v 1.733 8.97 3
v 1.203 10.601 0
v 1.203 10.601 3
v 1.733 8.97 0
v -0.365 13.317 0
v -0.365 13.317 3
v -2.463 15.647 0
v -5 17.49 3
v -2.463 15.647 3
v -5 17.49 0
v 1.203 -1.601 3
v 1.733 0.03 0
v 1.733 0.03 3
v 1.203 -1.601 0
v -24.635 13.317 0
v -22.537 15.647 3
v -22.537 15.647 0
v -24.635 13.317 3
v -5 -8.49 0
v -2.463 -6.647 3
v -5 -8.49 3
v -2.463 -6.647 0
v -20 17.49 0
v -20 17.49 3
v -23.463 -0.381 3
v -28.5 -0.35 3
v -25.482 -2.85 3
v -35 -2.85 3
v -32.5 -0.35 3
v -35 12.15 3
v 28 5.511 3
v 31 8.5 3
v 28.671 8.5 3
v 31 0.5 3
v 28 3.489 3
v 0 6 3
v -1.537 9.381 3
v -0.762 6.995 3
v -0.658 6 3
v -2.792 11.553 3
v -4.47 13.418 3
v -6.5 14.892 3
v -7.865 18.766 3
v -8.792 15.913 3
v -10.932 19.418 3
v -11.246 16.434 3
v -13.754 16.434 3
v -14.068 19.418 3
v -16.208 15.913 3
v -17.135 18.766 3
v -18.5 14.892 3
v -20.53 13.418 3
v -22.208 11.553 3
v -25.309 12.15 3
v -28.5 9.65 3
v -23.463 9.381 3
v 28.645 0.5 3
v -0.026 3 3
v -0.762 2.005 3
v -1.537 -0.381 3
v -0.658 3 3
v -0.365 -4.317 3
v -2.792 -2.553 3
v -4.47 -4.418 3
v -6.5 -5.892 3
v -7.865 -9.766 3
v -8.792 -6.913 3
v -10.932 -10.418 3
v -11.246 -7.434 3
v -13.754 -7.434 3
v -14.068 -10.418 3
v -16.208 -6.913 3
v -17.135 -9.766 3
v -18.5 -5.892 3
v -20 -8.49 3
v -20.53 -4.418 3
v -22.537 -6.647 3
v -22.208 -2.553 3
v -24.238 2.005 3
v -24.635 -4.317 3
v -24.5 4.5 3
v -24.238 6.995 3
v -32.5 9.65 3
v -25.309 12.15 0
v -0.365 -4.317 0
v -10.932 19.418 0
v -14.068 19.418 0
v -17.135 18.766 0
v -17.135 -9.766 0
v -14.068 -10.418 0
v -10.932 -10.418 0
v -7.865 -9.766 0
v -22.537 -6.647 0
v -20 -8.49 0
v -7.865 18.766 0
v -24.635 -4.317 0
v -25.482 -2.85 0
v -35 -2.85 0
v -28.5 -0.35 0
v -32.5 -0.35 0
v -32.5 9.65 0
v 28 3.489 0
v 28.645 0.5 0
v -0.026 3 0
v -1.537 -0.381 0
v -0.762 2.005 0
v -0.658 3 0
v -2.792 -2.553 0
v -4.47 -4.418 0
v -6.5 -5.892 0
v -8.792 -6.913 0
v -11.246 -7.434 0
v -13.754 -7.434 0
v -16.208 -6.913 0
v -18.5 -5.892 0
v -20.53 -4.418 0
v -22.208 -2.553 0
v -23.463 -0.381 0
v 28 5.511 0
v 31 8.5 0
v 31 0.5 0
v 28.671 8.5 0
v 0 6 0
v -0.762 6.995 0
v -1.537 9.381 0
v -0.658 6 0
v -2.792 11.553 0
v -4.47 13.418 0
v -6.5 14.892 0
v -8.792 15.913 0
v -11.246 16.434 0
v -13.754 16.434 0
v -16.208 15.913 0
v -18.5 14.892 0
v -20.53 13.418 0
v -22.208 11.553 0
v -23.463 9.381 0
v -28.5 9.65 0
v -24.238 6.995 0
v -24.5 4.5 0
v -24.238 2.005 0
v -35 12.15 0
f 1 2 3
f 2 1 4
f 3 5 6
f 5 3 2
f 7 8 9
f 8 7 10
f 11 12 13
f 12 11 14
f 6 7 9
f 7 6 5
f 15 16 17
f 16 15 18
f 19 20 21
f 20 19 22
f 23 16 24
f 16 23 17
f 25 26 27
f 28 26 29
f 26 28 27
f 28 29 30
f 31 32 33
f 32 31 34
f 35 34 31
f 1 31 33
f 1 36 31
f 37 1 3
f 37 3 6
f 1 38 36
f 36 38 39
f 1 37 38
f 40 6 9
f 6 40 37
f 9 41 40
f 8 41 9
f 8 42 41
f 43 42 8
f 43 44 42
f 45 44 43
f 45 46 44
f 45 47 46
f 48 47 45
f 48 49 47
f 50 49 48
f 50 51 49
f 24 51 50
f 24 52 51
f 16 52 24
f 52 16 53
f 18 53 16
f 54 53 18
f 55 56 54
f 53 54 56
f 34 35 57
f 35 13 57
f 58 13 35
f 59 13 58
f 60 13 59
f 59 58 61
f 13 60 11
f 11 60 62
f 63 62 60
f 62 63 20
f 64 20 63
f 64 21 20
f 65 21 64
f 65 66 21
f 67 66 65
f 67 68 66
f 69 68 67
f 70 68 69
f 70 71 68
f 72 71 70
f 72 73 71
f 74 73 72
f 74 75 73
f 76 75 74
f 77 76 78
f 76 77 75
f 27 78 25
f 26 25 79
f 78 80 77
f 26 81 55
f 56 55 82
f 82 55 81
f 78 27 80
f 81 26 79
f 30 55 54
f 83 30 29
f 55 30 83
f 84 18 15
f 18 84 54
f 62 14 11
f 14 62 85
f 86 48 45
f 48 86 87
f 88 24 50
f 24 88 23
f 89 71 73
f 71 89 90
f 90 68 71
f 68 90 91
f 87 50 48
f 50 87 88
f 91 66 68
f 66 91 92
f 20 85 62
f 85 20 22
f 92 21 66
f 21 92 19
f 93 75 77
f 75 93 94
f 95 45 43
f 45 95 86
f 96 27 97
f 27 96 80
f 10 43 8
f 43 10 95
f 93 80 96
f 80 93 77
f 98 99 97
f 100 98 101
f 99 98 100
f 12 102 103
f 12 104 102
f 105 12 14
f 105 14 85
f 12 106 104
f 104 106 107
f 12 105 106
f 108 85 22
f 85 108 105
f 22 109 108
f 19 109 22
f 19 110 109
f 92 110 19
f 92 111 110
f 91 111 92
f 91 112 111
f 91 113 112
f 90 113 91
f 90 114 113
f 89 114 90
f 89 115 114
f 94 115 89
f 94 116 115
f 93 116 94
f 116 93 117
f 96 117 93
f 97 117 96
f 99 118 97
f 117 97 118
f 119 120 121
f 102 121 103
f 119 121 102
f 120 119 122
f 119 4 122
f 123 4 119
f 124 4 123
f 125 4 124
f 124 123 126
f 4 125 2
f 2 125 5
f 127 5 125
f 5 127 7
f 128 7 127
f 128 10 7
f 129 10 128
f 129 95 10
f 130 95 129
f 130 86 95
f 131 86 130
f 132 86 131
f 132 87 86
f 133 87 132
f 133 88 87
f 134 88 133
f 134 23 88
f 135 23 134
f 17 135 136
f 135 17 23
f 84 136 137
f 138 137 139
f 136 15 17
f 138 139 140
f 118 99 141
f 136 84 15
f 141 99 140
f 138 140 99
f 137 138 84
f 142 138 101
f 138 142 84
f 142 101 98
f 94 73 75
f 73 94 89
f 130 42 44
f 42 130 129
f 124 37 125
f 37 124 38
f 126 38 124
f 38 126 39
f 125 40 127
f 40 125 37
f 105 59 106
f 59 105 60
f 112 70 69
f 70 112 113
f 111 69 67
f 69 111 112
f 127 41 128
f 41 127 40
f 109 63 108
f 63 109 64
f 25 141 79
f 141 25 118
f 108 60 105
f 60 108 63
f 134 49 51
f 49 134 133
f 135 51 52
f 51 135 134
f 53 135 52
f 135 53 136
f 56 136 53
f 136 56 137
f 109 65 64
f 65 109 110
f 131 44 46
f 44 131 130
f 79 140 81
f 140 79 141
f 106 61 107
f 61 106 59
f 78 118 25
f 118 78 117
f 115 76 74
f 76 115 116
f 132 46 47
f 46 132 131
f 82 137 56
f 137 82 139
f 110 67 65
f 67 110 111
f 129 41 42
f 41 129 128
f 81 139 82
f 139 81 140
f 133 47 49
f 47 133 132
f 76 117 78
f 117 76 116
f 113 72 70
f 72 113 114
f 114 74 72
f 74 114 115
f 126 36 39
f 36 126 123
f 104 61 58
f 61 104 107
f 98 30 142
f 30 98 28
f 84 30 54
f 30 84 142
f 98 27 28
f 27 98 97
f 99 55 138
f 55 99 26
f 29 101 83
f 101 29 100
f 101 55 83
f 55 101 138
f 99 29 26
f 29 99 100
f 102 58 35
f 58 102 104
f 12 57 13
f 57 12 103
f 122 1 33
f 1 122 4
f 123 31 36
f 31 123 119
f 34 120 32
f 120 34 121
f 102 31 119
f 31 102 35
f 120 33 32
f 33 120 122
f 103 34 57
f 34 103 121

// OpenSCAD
// CSG.scad - Basic example of CSG usage

thickness = 3;


rotate([0,0,1]) {  
  cube([30, thickness, thickness]);
}


translate ([0, 3 + thickness, 0]) {
    rotate([0,0,-1]) {
       cube([30, thickness, thickness]);
    }
}

translate([28,0.5,0]) {
   cube(size=[thickness, 8, thickness]);
}

cyl = 30;

translate([-12.5, 4.5, 0]) {

difference() {
    cylinder(h=thickness,d=cyl);
    translate([0, 0, -1]) {
        cylinder(h=thickness + 2,d=cyl-(thickness*2));
    }  
    translate([12.5,0,1]) {
        cube([5, thickness, 6], center=true);     
    }  
}

}

translate([-35,-2.85,0]) {

  difference() {
      cube([10, 15, thickness]);
      translate([2.5, 2.5, -2]) {
          cube([4, 10, 7]);
      }
  }
}


echo(version=version());
